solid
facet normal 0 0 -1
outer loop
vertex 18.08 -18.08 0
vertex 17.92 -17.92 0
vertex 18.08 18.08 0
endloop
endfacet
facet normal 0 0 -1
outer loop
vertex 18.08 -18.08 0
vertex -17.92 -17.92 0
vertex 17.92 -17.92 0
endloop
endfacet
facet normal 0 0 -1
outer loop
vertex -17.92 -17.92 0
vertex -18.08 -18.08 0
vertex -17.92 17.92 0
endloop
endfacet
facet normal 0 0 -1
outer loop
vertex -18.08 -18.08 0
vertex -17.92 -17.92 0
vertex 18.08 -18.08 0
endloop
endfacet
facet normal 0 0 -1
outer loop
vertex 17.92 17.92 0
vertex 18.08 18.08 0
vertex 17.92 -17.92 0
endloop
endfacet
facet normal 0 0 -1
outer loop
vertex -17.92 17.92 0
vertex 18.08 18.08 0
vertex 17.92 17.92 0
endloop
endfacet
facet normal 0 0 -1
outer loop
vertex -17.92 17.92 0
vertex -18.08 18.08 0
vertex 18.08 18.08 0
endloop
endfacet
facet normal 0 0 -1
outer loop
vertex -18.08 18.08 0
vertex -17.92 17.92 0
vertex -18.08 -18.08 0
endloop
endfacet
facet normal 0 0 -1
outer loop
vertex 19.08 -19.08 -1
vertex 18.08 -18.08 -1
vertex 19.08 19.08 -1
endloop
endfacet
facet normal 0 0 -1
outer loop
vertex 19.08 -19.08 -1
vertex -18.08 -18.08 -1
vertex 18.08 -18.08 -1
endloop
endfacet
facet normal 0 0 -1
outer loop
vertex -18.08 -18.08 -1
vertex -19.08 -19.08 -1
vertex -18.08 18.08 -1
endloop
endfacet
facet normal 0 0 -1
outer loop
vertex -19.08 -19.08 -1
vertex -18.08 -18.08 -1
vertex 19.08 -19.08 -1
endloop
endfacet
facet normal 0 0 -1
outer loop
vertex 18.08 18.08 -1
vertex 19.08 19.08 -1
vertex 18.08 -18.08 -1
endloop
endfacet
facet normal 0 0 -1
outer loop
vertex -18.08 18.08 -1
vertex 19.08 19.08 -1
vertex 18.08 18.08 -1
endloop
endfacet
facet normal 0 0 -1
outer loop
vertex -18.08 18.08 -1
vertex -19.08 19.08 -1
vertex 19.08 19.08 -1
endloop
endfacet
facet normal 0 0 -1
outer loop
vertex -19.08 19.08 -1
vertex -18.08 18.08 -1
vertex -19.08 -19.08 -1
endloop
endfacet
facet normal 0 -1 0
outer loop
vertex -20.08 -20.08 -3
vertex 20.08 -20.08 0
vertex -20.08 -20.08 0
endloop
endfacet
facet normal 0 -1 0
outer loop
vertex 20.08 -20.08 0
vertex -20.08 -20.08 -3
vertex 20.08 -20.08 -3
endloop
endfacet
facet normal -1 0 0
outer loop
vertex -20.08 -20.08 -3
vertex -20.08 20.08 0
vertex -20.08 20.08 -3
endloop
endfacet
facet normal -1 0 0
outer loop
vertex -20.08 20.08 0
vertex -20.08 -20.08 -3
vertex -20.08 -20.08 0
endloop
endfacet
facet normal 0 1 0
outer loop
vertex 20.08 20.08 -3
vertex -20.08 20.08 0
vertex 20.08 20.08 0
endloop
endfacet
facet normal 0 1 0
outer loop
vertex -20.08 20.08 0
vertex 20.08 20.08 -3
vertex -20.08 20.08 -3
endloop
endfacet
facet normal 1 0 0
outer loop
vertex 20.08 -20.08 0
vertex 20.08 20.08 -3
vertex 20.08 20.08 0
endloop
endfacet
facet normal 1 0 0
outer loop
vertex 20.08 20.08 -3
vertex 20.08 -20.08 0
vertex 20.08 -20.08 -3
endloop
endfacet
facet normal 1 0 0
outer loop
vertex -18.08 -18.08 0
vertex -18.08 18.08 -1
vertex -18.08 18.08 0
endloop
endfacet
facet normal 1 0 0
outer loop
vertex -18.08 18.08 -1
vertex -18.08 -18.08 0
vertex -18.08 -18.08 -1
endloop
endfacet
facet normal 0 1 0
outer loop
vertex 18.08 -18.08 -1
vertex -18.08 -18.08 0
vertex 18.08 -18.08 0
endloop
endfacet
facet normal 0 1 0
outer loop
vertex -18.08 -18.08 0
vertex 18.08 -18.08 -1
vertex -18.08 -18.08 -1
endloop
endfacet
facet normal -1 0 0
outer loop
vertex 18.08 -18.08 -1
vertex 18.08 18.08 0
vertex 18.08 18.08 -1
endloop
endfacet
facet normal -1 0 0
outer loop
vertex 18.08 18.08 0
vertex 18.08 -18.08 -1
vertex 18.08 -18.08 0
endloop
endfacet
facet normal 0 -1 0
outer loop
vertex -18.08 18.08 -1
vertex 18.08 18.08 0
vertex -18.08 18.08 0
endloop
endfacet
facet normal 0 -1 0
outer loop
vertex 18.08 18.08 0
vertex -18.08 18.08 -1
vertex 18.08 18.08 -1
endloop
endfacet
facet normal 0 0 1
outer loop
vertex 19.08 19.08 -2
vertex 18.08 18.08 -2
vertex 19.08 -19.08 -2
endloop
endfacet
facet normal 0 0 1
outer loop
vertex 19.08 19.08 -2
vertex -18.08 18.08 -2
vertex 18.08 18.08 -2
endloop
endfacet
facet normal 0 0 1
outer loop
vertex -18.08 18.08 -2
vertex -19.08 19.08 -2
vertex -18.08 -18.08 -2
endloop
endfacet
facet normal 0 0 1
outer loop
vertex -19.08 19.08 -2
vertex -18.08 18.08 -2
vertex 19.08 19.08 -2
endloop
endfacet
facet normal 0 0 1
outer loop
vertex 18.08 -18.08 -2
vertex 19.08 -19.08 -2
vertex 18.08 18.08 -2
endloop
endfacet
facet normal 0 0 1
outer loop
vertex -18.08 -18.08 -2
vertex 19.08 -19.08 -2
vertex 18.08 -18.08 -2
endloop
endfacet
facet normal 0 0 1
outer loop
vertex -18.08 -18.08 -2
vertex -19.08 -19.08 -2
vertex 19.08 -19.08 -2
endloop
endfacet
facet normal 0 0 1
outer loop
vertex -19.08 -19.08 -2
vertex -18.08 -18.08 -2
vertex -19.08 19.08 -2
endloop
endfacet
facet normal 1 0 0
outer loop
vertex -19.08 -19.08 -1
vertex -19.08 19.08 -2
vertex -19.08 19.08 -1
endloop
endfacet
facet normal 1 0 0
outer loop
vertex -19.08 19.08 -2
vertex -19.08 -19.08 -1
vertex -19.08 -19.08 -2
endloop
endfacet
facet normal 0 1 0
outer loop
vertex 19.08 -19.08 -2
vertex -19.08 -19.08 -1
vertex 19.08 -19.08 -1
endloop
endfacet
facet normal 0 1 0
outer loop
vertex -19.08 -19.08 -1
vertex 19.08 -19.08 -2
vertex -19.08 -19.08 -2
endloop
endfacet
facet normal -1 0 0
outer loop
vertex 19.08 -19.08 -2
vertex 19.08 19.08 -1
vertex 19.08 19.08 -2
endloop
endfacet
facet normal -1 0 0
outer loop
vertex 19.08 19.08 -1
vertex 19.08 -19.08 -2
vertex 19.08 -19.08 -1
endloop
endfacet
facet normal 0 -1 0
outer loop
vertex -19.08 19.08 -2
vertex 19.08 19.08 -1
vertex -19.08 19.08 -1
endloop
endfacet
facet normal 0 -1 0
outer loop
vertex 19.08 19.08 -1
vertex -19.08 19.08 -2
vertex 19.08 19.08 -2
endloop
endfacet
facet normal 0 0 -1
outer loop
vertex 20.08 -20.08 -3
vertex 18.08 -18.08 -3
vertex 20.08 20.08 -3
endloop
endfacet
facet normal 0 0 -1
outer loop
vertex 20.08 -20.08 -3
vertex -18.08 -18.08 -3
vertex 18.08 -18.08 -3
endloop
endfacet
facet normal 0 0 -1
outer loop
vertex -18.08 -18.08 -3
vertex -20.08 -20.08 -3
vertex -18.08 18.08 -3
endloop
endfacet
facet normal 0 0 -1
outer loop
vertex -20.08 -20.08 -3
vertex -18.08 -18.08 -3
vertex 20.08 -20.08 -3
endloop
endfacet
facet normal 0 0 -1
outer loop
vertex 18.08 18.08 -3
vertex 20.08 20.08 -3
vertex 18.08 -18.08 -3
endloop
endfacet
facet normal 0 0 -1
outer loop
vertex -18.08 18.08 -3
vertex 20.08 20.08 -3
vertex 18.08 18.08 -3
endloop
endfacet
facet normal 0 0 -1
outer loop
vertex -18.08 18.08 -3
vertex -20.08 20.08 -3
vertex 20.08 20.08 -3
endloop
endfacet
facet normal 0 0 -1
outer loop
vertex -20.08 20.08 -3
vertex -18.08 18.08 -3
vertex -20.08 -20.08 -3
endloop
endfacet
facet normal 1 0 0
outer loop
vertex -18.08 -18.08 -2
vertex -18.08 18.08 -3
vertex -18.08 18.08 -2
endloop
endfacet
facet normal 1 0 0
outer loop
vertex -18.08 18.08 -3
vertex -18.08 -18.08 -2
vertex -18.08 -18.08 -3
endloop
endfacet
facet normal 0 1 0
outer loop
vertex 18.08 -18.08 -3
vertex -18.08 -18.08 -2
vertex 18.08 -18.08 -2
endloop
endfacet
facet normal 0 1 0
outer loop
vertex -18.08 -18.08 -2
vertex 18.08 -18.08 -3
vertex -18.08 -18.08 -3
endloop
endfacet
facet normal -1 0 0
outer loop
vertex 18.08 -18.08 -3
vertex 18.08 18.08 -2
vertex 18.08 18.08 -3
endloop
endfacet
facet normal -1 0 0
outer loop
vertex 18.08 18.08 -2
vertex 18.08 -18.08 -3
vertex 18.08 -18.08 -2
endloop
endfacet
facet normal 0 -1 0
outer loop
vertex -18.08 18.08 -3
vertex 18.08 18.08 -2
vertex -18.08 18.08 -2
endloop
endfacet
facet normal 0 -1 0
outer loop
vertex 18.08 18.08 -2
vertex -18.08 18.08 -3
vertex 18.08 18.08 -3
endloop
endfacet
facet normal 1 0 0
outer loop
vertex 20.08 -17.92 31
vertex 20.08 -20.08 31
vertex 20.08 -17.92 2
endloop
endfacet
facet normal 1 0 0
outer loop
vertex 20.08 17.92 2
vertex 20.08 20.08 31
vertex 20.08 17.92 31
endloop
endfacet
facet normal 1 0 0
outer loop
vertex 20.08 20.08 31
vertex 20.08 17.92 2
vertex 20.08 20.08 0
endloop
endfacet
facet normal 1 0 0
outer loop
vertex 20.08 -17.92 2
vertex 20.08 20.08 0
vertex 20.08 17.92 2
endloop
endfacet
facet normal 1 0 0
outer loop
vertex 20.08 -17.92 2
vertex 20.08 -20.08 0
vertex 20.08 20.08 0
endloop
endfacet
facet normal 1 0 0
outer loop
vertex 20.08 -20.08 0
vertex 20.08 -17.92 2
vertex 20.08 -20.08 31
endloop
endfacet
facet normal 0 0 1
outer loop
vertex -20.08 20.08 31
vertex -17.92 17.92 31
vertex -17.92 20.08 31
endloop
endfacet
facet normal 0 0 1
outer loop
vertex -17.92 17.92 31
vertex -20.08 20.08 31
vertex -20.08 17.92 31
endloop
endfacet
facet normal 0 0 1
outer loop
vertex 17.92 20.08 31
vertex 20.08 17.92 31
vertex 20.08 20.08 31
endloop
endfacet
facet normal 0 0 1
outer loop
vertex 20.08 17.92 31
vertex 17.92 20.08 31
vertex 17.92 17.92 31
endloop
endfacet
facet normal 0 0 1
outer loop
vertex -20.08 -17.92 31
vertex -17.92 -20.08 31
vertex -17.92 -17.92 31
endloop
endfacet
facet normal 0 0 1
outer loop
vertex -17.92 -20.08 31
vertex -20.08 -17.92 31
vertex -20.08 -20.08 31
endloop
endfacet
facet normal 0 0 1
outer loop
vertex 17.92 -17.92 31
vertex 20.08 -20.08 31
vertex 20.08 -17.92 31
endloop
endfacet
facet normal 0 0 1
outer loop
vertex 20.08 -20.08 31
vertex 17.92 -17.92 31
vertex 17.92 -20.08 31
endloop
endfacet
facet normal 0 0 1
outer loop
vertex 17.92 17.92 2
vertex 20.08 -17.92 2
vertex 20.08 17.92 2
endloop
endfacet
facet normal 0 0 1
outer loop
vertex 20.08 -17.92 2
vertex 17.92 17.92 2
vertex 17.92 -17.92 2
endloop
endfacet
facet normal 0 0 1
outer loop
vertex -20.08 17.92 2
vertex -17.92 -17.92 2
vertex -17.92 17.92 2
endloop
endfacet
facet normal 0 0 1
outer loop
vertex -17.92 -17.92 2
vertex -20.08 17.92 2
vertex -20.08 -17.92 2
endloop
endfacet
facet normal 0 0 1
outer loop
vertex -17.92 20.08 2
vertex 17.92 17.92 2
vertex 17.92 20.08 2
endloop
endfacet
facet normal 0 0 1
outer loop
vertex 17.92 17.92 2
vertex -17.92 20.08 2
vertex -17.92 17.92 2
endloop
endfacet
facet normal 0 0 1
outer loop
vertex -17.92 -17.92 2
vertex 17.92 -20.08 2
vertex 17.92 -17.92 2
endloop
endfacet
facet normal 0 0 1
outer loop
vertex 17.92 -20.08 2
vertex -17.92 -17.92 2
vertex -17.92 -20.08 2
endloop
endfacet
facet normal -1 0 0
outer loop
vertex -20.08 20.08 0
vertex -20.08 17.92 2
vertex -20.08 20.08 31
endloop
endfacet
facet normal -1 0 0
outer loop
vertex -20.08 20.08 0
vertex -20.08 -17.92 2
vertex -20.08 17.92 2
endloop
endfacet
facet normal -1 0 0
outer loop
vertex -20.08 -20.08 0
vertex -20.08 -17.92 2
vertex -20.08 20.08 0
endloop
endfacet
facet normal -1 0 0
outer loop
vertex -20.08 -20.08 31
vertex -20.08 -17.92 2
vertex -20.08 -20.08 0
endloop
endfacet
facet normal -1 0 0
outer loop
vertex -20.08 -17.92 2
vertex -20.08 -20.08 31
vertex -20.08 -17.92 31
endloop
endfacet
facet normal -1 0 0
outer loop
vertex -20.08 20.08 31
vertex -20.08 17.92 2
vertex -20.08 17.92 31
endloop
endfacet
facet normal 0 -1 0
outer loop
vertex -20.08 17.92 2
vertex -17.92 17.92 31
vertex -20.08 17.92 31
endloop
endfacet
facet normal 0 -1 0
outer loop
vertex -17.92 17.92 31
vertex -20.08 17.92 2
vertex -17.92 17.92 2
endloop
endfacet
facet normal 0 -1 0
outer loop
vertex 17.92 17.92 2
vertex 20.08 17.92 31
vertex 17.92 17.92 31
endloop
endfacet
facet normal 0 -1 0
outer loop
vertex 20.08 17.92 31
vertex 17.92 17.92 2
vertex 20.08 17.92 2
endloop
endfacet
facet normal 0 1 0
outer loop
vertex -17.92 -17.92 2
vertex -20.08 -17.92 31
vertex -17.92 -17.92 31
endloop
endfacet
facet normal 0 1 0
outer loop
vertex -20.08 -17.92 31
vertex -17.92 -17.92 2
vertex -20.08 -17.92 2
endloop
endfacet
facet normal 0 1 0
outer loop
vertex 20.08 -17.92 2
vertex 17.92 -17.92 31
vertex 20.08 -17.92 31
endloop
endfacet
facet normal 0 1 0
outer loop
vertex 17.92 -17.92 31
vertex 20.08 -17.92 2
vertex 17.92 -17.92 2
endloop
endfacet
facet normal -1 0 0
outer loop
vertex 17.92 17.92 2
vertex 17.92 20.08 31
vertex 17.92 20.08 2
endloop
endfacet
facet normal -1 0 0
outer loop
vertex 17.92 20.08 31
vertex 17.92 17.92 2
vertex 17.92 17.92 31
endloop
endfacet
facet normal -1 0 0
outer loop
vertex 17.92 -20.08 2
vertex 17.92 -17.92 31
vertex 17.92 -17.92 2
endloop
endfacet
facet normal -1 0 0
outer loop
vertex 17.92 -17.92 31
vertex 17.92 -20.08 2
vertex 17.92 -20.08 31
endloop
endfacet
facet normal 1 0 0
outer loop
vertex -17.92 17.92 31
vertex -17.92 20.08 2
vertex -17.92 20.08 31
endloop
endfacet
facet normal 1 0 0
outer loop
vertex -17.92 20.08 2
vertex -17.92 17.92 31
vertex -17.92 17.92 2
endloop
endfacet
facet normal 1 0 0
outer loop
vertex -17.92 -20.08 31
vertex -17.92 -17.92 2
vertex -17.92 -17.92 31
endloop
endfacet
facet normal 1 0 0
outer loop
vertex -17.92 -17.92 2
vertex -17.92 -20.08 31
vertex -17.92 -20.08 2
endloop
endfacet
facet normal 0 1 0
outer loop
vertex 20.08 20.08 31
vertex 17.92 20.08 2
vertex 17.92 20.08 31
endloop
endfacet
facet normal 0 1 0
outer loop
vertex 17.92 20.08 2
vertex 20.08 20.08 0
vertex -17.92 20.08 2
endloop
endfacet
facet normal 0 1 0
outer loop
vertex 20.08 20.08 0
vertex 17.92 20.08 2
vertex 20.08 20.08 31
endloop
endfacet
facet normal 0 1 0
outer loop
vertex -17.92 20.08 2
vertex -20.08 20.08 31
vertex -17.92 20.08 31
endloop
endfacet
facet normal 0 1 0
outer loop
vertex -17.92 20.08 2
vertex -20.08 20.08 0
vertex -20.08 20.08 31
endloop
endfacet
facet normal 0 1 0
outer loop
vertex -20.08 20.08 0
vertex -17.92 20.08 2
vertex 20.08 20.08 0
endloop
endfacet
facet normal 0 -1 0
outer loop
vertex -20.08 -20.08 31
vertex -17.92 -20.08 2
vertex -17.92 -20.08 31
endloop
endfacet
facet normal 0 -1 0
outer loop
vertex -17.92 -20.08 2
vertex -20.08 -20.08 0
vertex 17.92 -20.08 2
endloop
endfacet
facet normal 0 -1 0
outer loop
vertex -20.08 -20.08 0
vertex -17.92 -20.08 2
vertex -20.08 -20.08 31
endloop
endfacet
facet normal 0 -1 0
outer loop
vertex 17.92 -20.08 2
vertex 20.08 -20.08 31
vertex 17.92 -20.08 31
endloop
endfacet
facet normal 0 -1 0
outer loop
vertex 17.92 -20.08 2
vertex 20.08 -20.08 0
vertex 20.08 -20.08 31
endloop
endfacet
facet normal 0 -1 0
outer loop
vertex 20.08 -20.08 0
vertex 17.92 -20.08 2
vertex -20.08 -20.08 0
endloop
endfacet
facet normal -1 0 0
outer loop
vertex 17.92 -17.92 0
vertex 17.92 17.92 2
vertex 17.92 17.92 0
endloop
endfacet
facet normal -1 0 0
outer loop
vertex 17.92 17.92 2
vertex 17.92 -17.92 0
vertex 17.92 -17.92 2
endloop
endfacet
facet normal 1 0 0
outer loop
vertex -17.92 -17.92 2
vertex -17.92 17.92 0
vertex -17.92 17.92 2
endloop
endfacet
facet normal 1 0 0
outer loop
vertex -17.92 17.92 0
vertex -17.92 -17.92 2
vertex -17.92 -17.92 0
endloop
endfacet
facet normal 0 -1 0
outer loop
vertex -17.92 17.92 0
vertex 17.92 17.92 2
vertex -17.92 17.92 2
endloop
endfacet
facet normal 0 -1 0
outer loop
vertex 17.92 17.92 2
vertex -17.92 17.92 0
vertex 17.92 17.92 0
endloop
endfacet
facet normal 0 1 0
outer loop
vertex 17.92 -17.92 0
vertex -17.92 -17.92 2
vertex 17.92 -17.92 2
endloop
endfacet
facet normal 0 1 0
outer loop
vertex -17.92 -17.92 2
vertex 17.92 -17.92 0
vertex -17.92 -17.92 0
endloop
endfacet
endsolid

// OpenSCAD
// file: slide.scad
module slide() {
    cube([slide_length, slide_height, slide_thickness], true);
}

slide();
// file: config.scad
$fn = $preview ? 32 : 128;
thread_fn = $preview ? 16 : 128;

blower_inner_radius = 41.7 / 2;
blower_lip_width = 9.5;
blower_lip_depth = 2.5;
blower_inset_depth = 2.5;
blower_inset_radius = 34 / 2;
blower_lip_thickness = 2;
blower_middle_depth = 2.5;
blower_outer_radius = 49 / 2;
blower_upper_depth = 5;

slide_length = 38;
slide_height = 30;
slide_thickness = 1.2;
slide_mount_wall_thickness = slide_thickness * 1.8;
slide_mount_width = slide_length + slide_mount_wall_thickness;
clip_depth = 1;
flue_slit_length = slide_mount_width * 0.8;
flue_taper_into_slit = 20; 
flue_floor_thickness = slide_mount_wall_thickness;
flue_slit_depth = 1;
flue_slit_offset = 5;

window_post_width = 2;
window_post_height = slide_height + clip_depth;

thread_size = "M42";
thread_turns = 2;
thread_pitch = 4.5;
// main file
include <config.scad>
use <slide.scad>

module clip_to_lower() {
    linear_extrude(clip_depth) difference()  {
        square([slide_mount_width, slide_mount_width], true);
        square([slide_mount_width - 4 * clip_depth, slide_mount_width - 4 * clip_depth], true);
    }
    
    translate([0, 0, clip_depth]) linear_extrude(clip_depth) difference()  {
            square([slide_mount_width, slide_mount_width], true);
            square([slide_mount_width - 2 * clip_depth, slide_mount_width - 2 * clip_depth], true);
    }
    
    translate([0, 0, clip_depth * 2]) linear_extrude(clip_depth) difference()  {
        square([slide_mount_width, slide_mount_width], true);
        square([slide_mount_width - 4 * clip_depth, slide_mount_width - 4 * clip_depth], true);
    }
} 

module flue_middle() {
    rotate([180, 0, 0]) clip_to_lower();

    translate([0, 0, window_post_height / 2]) difference() {
        cube([slide_mount_width, slide_mount_width, window_post_height], true);
        cube([slide_mount_width - 2 * slide_mount_wall_thickness, slide_mount_width - 2 * slide_mount_wall_thickness, window_post_height], true);
            
        translate([0, 0, clip_depth]) {
            cube([slide_mount_width, slide_mount_width - 2 * slide_mount_wall_thickness, window_post_height - 2 * clip_depth], true);
            cube([slide_mount_width - 2 * slide_mount_wall_thickness, slide_mount_width, window_post_height - 2 * clip_depth], true);
        }
    }
}

flue_middle();
